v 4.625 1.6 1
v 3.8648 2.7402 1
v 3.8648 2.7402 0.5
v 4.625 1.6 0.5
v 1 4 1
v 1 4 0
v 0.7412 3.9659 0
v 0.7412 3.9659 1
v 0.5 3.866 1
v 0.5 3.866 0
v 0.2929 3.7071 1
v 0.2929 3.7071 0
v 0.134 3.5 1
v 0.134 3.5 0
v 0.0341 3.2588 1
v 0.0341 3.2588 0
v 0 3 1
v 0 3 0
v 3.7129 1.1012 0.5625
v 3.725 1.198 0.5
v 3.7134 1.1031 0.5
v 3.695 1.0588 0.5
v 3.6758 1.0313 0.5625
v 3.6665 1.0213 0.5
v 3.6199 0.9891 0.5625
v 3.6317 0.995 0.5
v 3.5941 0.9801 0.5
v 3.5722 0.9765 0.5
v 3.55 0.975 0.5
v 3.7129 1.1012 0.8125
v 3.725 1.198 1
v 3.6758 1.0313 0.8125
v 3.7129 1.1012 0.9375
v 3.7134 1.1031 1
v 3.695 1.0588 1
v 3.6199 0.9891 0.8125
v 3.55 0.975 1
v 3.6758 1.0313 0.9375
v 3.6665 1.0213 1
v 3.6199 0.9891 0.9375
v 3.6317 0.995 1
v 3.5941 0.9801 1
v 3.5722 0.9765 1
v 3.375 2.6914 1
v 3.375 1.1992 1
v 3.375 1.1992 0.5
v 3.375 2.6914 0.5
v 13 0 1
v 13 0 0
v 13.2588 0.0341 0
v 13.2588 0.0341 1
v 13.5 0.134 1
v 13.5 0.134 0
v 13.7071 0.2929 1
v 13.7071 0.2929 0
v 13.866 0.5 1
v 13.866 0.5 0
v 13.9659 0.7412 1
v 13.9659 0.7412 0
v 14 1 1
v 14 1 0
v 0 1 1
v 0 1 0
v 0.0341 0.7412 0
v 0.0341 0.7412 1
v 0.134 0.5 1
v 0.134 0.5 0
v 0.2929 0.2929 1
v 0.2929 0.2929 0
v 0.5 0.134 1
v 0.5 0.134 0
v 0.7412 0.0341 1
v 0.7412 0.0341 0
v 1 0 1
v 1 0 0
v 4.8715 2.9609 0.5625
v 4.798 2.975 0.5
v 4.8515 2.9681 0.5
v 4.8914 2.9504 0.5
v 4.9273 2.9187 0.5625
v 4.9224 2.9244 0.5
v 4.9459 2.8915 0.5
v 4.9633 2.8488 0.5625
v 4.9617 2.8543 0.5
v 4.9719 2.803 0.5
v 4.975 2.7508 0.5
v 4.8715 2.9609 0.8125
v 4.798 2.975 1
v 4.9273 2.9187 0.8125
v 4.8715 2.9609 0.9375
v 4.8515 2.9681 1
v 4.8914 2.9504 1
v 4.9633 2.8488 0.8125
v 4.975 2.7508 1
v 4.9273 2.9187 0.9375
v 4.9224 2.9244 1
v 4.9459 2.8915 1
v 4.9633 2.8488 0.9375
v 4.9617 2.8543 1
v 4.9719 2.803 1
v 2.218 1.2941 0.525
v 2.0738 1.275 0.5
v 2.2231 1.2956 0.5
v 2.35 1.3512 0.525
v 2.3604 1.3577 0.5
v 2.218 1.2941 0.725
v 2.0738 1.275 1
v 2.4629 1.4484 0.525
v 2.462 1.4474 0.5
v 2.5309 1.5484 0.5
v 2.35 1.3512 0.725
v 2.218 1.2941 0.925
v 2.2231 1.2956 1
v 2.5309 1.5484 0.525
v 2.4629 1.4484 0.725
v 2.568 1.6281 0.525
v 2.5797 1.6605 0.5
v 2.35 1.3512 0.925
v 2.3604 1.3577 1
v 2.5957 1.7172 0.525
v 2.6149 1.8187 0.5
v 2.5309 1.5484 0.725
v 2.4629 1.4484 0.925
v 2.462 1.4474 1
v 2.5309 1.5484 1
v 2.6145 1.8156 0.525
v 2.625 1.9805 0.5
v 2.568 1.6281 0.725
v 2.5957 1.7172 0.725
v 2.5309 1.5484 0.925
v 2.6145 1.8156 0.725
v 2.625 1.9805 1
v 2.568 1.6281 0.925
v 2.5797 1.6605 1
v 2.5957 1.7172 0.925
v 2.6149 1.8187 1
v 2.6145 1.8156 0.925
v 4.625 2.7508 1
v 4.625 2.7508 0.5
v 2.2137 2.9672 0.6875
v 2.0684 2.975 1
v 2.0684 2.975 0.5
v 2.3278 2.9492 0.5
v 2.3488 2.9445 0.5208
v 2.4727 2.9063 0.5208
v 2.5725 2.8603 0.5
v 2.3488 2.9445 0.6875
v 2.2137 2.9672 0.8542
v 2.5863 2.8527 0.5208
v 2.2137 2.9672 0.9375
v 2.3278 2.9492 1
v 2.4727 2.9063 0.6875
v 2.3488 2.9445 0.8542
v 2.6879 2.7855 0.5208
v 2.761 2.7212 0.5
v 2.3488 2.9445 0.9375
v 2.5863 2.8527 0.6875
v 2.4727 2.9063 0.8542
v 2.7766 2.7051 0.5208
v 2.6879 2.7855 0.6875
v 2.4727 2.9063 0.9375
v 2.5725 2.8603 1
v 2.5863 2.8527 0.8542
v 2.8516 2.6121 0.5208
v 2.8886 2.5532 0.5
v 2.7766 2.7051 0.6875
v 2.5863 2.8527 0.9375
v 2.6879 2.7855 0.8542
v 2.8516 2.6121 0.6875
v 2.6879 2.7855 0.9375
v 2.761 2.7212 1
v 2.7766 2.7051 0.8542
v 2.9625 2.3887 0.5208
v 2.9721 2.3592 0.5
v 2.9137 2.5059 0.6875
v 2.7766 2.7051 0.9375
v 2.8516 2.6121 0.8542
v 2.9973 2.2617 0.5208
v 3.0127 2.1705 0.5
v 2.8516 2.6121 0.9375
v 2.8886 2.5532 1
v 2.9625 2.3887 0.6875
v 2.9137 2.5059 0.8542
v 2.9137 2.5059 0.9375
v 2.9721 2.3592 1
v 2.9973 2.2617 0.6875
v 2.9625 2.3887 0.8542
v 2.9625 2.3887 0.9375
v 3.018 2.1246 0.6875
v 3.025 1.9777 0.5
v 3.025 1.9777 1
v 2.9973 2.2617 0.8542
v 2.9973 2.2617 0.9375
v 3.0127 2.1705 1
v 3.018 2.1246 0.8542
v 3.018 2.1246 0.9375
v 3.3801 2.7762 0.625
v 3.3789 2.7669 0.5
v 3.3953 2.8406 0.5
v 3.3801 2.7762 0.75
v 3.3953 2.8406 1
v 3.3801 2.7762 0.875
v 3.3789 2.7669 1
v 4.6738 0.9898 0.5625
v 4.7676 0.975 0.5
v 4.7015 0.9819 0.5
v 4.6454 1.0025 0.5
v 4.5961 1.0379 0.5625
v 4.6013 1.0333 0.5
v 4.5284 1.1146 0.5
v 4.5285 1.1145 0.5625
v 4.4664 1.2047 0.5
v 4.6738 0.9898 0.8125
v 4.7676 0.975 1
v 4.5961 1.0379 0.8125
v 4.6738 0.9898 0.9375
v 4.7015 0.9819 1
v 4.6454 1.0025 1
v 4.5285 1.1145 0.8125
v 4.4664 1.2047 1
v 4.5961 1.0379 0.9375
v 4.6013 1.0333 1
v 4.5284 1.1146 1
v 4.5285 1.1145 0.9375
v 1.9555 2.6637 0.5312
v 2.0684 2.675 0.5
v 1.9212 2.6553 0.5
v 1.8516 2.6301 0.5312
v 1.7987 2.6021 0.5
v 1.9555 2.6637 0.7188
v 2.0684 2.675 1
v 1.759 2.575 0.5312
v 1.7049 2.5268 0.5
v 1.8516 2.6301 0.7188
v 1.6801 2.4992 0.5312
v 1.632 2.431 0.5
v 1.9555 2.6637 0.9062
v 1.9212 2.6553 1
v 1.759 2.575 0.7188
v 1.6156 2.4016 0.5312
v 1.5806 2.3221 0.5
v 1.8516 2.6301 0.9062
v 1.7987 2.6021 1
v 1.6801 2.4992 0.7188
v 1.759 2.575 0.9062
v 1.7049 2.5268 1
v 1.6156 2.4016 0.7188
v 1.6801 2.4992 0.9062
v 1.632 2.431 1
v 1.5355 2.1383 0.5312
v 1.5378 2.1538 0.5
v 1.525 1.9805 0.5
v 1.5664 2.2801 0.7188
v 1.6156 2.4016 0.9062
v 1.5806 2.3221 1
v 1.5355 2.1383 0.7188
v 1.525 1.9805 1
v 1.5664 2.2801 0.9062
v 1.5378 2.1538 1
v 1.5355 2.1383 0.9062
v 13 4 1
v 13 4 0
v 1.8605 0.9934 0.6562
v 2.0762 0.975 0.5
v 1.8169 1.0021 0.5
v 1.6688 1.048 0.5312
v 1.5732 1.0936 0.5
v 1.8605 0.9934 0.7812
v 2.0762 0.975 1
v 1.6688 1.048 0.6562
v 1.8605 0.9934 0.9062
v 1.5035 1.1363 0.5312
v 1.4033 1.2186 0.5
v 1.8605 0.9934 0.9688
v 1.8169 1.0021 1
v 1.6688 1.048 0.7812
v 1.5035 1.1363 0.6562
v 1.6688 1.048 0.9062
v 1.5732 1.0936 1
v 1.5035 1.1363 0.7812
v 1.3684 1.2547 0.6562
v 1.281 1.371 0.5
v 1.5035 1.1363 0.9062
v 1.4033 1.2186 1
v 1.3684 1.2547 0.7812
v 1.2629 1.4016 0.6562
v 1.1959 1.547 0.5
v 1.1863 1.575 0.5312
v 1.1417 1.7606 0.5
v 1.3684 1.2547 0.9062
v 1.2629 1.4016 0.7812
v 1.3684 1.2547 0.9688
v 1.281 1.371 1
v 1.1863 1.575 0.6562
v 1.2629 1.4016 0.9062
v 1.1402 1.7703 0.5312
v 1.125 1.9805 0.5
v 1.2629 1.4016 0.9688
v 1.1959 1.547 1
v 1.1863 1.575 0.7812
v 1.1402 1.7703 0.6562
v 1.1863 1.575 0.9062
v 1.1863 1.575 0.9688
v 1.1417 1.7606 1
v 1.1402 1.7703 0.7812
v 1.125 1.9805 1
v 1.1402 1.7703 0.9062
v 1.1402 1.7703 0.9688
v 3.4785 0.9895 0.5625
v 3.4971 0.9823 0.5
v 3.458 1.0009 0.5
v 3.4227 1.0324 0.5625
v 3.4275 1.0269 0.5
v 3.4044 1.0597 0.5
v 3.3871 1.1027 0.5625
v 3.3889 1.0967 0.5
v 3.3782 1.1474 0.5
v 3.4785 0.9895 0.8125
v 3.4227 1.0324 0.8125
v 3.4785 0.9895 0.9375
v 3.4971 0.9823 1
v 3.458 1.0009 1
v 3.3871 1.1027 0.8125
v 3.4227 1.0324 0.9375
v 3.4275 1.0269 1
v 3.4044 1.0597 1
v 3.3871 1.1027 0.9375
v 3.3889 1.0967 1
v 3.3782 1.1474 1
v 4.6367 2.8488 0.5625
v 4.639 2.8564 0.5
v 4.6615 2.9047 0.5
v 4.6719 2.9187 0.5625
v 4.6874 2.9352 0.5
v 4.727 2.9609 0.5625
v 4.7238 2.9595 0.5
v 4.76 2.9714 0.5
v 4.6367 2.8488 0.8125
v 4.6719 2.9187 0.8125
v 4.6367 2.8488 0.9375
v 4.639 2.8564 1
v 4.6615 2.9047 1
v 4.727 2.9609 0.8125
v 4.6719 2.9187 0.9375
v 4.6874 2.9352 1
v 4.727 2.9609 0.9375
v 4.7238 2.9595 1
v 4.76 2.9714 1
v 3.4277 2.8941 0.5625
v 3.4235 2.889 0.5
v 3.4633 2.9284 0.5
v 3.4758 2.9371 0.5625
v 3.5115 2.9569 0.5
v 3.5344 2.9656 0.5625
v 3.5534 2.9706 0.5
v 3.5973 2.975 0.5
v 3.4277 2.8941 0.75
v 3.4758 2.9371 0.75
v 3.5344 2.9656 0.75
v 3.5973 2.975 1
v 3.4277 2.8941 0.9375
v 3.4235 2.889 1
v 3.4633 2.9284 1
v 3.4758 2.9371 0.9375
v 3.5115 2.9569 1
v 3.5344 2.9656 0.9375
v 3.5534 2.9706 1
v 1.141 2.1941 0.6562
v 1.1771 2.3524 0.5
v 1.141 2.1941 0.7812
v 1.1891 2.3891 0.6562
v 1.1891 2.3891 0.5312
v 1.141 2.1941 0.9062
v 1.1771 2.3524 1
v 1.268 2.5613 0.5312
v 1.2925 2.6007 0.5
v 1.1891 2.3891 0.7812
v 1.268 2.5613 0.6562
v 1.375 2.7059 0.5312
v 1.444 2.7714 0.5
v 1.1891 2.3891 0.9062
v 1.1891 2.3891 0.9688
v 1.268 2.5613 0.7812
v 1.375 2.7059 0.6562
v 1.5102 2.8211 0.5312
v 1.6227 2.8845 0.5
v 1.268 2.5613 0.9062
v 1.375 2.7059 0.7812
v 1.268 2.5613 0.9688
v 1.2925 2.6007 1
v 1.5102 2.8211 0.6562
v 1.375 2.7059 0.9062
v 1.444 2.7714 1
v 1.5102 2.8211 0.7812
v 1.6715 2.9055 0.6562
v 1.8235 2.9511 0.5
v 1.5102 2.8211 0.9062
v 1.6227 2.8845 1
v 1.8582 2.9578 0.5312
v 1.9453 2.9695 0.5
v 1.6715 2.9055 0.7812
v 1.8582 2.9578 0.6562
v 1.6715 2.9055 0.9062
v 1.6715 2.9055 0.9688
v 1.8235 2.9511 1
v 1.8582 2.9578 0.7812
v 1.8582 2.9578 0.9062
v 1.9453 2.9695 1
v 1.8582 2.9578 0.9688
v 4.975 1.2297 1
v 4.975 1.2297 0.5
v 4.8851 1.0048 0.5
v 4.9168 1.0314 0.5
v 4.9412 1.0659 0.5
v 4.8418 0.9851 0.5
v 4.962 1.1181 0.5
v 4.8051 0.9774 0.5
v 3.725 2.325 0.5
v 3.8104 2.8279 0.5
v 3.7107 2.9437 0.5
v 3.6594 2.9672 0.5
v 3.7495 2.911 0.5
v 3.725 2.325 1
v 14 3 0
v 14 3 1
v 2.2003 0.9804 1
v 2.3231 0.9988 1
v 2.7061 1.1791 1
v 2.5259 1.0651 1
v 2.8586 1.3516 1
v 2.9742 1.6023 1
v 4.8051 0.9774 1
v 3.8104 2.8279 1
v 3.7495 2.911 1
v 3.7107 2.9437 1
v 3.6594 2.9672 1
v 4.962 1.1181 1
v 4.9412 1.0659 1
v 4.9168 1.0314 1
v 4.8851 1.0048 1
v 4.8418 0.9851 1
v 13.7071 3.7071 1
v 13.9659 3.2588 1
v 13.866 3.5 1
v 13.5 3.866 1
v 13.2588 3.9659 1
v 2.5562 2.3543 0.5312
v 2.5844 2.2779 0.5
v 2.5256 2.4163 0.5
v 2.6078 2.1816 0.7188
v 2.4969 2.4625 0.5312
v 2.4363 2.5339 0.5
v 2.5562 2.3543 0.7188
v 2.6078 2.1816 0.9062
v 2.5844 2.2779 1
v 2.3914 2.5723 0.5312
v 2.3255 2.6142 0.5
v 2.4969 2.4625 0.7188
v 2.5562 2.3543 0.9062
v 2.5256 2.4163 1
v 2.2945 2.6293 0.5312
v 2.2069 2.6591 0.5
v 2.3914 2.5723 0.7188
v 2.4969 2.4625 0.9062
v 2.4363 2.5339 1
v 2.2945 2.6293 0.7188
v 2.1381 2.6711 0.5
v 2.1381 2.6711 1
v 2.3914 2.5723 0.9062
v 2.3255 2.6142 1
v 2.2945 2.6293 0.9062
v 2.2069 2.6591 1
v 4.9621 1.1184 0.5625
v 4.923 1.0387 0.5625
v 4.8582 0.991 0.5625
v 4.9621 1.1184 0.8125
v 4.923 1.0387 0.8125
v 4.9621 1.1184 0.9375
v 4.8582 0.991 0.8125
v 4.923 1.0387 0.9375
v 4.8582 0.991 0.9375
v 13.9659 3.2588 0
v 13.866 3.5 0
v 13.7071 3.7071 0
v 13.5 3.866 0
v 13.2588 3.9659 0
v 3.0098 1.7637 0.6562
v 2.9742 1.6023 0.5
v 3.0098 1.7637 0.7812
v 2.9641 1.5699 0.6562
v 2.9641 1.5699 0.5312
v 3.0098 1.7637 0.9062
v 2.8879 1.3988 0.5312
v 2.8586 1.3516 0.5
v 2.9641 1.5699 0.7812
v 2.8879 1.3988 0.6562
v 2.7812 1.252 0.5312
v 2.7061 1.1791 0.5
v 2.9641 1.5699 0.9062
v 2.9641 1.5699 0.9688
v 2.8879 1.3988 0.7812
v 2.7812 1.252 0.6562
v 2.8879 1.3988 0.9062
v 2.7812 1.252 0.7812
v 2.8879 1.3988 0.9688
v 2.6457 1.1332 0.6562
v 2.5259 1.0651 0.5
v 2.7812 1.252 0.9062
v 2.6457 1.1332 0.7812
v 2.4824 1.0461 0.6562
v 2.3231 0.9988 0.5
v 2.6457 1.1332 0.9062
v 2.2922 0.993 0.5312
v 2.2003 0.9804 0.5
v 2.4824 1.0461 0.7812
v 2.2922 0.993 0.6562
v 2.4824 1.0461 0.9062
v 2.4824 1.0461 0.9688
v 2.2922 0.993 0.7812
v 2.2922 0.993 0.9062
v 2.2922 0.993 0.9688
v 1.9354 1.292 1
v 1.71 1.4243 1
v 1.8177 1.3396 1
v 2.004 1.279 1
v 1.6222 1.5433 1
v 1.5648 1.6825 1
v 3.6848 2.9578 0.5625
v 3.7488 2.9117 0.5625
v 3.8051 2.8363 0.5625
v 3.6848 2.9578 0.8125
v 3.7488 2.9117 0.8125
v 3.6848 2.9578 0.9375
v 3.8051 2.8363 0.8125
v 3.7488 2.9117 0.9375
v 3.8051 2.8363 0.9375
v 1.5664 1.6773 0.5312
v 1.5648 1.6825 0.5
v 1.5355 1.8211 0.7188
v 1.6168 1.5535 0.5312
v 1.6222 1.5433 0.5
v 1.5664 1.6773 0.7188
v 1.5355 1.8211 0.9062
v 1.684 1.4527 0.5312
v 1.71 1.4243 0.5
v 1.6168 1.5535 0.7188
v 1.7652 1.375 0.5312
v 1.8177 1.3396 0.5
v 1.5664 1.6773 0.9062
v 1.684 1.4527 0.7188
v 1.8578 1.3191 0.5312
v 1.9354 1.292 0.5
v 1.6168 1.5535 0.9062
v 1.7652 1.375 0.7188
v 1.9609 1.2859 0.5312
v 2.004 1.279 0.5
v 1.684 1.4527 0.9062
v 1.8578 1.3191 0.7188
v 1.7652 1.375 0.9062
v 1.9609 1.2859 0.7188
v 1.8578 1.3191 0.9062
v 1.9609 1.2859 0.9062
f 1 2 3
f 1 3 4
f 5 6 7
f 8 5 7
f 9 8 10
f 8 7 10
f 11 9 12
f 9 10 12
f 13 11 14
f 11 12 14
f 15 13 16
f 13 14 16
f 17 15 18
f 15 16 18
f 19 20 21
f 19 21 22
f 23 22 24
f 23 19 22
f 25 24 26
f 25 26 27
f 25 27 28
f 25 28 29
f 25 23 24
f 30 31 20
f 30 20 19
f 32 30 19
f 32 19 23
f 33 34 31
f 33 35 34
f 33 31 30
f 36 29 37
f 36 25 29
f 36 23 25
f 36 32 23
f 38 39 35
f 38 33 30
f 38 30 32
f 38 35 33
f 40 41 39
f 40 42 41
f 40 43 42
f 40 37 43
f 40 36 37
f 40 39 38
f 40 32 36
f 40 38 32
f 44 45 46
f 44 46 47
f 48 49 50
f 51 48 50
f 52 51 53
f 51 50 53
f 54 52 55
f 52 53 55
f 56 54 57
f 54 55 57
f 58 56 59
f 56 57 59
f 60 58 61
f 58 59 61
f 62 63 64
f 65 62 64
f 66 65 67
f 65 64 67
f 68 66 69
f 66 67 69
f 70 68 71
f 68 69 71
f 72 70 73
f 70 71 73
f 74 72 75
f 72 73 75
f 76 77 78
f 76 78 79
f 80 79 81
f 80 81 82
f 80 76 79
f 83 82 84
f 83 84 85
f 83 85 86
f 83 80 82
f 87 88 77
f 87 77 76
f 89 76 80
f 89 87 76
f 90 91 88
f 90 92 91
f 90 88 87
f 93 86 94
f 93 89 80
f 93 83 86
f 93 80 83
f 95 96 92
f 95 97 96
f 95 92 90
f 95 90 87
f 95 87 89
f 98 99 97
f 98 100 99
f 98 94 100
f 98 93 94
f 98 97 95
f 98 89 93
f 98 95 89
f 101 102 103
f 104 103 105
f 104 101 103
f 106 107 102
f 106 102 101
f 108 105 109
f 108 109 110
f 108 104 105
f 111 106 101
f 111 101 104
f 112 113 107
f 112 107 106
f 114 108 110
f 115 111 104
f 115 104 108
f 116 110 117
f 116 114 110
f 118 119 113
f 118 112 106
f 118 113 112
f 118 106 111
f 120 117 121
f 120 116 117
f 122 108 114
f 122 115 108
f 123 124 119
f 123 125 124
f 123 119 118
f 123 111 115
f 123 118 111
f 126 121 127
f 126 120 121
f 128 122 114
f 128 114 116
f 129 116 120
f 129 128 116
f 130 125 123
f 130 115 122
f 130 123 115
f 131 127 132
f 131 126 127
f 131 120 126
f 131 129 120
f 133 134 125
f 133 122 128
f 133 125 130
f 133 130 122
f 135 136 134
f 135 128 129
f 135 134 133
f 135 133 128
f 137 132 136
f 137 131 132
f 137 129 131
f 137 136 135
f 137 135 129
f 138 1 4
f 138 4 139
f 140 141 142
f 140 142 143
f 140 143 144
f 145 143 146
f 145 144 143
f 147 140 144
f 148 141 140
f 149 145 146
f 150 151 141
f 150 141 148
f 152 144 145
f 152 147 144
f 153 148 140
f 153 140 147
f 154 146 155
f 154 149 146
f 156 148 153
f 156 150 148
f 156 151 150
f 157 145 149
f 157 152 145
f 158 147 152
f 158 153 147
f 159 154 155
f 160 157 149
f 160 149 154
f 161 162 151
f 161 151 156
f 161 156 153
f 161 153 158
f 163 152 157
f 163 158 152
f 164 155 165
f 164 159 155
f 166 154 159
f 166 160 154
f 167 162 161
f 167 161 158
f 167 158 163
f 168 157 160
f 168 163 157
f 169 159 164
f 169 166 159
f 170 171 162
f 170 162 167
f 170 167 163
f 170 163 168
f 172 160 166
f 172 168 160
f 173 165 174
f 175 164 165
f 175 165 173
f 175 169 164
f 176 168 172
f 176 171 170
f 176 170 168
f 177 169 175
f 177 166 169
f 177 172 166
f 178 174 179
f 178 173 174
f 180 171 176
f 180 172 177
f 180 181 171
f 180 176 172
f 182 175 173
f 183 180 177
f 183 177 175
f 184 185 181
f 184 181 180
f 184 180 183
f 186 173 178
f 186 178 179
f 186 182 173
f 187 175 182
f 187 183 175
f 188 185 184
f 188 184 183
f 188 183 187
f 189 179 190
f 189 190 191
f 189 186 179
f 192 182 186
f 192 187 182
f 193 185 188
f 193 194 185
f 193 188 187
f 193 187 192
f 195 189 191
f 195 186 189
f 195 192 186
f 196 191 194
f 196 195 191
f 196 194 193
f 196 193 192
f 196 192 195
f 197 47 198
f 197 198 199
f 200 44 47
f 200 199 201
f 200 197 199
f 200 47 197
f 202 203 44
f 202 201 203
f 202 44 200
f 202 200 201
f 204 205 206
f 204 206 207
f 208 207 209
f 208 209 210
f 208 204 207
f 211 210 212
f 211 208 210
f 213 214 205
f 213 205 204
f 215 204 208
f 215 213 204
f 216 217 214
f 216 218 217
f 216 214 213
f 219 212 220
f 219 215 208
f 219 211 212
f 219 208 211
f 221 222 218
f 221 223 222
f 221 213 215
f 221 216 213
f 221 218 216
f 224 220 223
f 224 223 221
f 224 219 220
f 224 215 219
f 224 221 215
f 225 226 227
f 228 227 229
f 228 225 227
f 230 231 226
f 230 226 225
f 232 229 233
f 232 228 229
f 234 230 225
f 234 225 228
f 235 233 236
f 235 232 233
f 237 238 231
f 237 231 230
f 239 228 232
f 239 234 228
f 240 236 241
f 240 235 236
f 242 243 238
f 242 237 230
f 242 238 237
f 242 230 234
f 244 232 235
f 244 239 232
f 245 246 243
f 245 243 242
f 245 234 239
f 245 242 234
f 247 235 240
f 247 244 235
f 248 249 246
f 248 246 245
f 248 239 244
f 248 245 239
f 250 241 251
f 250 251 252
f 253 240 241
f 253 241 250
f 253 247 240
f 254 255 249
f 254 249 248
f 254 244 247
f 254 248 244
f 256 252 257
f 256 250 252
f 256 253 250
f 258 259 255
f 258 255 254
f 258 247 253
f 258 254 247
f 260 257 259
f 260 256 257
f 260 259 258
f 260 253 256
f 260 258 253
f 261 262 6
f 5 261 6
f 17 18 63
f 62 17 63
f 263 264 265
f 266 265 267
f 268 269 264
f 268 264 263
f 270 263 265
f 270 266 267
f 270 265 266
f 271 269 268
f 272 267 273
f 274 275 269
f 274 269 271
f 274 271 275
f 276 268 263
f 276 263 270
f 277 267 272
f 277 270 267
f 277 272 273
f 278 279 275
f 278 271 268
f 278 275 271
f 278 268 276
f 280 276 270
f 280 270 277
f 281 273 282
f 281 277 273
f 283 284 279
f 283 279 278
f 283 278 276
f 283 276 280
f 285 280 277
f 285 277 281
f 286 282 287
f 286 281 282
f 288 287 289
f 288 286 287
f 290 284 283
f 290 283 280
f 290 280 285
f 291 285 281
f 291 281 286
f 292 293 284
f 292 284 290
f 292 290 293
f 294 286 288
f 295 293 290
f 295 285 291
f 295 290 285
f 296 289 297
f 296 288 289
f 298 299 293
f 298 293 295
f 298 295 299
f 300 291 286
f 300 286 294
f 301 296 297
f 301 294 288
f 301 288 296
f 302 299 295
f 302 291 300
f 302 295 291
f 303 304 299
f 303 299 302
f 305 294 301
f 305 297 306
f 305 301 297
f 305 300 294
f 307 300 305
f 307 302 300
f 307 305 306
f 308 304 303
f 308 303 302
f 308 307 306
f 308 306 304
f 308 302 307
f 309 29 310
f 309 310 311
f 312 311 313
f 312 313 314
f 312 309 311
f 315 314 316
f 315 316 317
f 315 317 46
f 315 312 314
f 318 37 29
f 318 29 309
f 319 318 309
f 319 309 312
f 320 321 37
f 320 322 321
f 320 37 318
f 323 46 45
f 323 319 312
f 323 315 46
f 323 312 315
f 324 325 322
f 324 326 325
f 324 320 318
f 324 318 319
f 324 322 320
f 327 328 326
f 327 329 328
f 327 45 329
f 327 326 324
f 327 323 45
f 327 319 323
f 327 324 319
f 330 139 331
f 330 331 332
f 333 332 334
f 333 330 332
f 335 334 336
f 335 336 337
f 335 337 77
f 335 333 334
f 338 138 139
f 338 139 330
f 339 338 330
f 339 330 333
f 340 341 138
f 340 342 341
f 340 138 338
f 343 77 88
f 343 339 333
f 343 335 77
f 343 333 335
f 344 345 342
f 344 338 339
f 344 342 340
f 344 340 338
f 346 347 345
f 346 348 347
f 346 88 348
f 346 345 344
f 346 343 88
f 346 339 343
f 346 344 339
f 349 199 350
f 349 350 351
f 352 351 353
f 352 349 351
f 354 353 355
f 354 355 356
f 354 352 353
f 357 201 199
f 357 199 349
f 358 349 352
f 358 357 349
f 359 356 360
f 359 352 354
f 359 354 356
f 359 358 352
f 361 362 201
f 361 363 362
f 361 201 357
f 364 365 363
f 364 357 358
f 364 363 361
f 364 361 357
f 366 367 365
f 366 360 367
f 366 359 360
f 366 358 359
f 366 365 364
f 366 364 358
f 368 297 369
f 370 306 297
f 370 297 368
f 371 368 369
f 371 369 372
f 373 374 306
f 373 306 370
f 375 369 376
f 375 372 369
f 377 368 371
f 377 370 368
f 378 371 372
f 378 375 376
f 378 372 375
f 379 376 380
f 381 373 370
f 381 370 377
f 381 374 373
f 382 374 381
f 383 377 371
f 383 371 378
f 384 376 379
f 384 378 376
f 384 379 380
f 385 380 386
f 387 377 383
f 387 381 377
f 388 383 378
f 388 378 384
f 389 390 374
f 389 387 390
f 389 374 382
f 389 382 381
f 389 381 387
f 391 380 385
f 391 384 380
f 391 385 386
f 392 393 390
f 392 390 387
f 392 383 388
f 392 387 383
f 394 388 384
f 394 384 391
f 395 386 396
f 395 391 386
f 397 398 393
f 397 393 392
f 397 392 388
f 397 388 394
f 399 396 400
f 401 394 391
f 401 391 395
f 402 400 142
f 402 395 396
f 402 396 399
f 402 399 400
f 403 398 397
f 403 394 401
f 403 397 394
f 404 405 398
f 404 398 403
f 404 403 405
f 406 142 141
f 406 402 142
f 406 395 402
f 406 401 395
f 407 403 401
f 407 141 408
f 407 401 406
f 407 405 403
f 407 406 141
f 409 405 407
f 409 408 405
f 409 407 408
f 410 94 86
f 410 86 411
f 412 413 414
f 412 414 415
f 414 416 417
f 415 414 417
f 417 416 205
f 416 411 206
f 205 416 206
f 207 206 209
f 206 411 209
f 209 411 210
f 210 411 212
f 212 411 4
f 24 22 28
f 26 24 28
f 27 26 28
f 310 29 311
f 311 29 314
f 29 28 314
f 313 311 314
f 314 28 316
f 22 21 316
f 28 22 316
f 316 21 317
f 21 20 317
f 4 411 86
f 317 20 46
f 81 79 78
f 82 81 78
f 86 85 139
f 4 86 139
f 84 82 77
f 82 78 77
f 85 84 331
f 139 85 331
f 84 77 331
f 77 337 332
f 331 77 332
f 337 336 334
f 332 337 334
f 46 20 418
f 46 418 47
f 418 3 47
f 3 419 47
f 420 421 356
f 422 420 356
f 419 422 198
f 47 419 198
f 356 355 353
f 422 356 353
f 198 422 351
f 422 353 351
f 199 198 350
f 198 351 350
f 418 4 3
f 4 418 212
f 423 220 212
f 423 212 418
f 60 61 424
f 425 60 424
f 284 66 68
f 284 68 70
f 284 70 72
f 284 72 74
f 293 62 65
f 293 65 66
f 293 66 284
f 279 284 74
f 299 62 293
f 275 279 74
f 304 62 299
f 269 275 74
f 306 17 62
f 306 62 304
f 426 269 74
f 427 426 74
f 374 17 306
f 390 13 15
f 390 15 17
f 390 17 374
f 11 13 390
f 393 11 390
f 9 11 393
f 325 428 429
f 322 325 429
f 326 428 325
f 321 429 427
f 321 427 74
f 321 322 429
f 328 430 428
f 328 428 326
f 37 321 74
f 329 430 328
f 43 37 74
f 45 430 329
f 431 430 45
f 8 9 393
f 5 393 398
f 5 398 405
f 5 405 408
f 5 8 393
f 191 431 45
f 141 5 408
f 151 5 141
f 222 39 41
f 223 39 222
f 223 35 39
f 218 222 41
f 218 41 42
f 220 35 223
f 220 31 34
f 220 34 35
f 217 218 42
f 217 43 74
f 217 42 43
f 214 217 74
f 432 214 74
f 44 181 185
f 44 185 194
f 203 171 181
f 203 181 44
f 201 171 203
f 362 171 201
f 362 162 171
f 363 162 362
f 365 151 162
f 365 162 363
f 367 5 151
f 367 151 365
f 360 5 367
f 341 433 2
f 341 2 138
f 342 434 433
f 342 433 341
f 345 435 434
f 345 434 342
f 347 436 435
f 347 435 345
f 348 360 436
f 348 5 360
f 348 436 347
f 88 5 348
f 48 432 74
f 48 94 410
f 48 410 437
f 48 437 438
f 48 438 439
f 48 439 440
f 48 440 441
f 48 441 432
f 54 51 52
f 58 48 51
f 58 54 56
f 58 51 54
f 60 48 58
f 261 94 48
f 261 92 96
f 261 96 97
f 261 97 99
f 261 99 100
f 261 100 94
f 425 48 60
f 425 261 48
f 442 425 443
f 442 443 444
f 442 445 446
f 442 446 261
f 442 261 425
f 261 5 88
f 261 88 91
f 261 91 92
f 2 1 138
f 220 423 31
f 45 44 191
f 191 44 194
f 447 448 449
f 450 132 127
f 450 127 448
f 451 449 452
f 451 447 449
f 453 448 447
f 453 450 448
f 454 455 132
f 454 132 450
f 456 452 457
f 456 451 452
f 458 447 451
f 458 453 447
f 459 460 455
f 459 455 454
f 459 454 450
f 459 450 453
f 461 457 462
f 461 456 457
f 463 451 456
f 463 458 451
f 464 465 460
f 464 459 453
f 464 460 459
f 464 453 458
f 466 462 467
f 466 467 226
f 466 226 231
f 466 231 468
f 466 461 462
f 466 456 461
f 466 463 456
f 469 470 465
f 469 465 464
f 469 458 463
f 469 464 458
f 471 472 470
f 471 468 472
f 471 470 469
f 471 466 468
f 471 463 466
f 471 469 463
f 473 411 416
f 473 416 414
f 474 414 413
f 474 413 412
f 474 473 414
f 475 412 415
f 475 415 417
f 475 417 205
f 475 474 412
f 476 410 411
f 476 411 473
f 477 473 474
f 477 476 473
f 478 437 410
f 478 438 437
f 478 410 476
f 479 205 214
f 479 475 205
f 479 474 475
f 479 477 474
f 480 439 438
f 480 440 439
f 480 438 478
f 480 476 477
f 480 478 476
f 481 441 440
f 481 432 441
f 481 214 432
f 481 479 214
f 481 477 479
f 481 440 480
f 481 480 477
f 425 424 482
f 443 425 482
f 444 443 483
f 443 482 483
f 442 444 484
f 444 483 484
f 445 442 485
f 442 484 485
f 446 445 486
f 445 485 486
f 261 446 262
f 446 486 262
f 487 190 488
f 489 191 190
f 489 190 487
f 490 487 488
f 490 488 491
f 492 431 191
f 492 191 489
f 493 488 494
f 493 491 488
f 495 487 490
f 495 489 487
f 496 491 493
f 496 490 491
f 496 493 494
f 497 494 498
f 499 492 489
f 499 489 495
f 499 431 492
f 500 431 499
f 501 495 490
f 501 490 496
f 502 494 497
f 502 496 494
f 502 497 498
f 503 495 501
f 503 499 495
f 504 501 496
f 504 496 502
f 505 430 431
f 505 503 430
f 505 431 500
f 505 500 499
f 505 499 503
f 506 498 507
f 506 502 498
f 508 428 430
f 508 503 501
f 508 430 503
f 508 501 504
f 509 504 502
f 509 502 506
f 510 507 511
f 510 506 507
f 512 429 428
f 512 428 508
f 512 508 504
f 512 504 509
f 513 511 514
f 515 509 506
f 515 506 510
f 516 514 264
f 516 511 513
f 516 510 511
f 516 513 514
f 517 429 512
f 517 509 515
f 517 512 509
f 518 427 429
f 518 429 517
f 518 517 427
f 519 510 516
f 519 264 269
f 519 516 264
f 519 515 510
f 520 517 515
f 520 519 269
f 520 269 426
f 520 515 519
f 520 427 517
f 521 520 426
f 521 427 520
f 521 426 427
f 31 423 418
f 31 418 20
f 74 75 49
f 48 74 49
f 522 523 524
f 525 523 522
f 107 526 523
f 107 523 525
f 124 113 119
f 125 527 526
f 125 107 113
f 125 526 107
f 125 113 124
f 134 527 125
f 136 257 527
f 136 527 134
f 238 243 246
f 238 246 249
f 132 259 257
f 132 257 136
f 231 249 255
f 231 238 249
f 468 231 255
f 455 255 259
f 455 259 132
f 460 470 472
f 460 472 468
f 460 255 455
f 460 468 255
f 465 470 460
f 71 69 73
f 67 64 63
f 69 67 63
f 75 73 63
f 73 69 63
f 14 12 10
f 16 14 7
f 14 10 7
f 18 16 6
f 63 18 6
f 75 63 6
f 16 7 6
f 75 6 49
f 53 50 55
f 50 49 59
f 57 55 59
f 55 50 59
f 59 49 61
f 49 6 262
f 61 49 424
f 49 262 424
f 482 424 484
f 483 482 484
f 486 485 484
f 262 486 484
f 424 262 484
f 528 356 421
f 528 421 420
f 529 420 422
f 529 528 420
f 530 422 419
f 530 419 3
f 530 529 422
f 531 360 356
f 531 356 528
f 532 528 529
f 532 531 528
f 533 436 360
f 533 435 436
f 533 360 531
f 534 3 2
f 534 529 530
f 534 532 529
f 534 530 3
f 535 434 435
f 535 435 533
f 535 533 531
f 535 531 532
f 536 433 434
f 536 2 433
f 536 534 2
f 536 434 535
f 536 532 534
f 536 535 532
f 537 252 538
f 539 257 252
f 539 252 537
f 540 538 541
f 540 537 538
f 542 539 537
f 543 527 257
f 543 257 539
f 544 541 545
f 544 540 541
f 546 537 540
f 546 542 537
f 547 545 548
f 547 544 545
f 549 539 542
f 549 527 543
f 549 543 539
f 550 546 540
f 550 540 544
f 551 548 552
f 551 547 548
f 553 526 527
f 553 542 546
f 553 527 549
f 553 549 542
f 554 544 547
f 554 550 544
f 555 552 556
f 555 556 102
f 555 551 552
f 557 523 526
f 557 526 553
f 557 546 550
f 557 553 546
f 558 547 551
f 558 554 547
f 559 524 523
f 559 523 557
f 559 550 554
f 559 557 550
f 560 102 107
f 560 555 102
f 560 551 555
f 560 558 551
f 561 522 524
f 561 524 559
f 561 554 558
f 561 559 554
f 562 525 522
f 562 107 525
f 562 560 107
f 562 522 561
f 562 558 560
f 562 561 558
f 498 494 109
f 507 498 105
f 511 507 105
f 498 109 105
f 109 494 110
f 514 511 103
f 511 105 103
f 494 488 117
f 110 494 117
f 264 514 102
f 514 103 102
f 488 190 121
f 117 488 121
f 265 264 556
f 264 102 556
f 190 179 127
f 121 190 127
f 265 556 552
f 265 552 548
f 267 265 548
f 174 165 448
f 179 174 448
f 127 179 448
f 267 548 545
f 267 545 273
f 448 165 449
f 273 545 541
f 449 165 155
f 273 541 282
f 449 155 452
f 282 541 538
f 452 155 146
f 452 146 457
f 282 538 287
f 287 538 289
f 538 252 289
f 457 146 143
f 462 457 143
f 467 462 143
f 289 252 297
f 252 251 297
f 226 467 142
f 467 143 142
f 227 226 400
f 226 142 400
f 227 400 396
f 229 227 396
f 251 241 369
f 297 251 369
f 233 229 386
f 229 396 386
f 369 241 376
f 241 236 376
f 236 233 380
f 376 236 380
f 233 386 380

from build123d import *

# Parameters (mm, degrees)
AUFSATZ_LINEAR_AUSTRAGEN1_DEPTH = 1
SCHNITT_LINEAR_AUSTRAGEN1_DEPTH = 0.5


with BuildPart() as part:
    # Skizze1 → Aufsatz-Linear austragen1 (new body)
    with BuildSketch(Plane.XY):
        with BuildLine():
            Line((1, 0), (13, 0))
            ThreePointArc((13, 0), (13.707106781, 0.292893219), (14, 1))
            Line((14, 1), (14, 3))
            ThreePointArc((14, 3), (13.707106781, 3.707106781), (13, 4))
            Line((13, 4), (1, 4))
            ThreePointArc((1, 4), (0.292893219, 3.707106781), (0, 3))
            Line((0, 3), (0, 1))
            ThreePointArc((0, 1), (0.292893219, 0.292893219), (1, 0))
        make_face()
    extrude(amount=AUFSATZ_LINEAR_AUSTRAGEN1_DEPTH)

    # Skizze2 → Schnitt-Linear austragen1 (cut)
    # profile 1 of 2: a face of its own
    with BuildSketch(Plane.XY.offset(1)):
        with BuildLine():
            add(Edge.make_bspline(
                [(2.068359375, 2.975), (2.093112394, 2.974652516), (2.14164836, 2.973971167), (2.213088792, 2.96779492), (2.281989676, 2.95862748), (2.348304365, 2.945431971), (2.411868349, 2.928213747), (2.472693733, 2.90705225), (2.530858895, 2.882017573), (2.586431863, 2.853600887), (2.638802164, 2.821433292), (2.688303235, 2.786256364), (2.73437439, 2.747554036), (2.77712302, 2.705666037), (2.816276383, 2.660478074), (2.852403686, 2.612241049), (2.885226635, 2.56068362), (2.914391718, 2.505816744), (2.940594574, 2.44846024), (2.963340406, 2.388446006), (2.982324979, 2.326028293), (2.998116048, 2.26110371), (3.010084082, 2.193767278), (3.018514176, 2.123861297), (3.024350356, 2.051661497), (3.024781349, 2.002616087), (3.025, 1.977734375)],
                knots=[0, 0, 0, 0, 1.137132438, 2.22970057, 3.292424762, 4.329649132, 5.333981859, 6.315987487, 7.286185149, 8.241436353, 9.181332131, 10.107725602, 11.0292572, 11.943085262, 12.854854597, 13.773819033, 14.709898734, 15.660115542, 16.626635295, 17.605574315, 18.606712189, 19.622473761, 20.67399022, 21.747038223, 22.857027702, 24, 24, 24, 24], degree=3))
            add(Edge.make_bspline(
                [(3.025, 1.977734375), (3.024236943, 1.941248344), (3.022739737, 1.869658489), (3.011382941, 1.76485224), (2.992130943, 1.66508578), (2.965911152, 1.570399581), (2.931448688, 1.481449161), (2.889521373, 1.398351336), (2.839716722, 1.321507209), (2.782571307, 1.250986245), (2.718303636, 1.18718792), (2.646474639, 1.13157047), (2.567529745, 1.084100864), (2.48217021, 1.044116269), (2.38988477, 1.012613038), (2.290860282, 0.991433257), (2.185708374, 0.977018048), (2.11333274, 0.975684634), (2.076171875, 0.975)],
                knots=[0, 0, 0, 0, 1.119700056, 2.196982321, 3.230778928, 4.235358115, 5.208318876, 6.153781848, 7.087131445, 8.013361148, 8.934611457, 9.860297843, 10.794468433, 11.756326826, 12.748403726, 13.780058436, 14.860183413, 16, 16, 16, 16], degree=3))
            add(Edge.make_bspline(
                [(2.076171875, 0.975), (2.03927875, 0.975888232), (1.967053764, 0.977627108), (1.861766869, 0.991561146), (1.762215291, 1.013976035), (1.668967416, 1.04602514), (1.582674595, 1.08683826), (1.502975001, 1.134344554), (1.431414901, 1.190464862), (1.367075118, 1.253597267), (1.309960779, 1.323841341), (1.261404629, 1.401545242), (1.218582067, 1.485017774), (1.184733705, 1.575497068), (1.157803717, 1.671020204), (1.13882396, 1.770875151), (1.127251689, 1.874465923), (1.125758488, 1.944761386), (1.125, 1.98046875)],
                knots=[0, 0, 0, 0, 1.130091603, 2.212359386, 3.247930852, 4.252250901, 5.226719473, 6.16821431, 7.089197795, 8.00610207, 8.925165125, 9.855999165, 10.808795857, 11.79501972, 12.810514548, 13.846493258, 14.906102224, 16, 16, 16, 16], degree=3))
            add(Edge.make_bspline(
                [(1.125, 1.98046875), (1.125688028, 2.016832883), (1.127040936, 2.088337779), (1.139531744, 2.193099625), (1.15925301, 2.293397724), (1.187362441, 2.388727145), (1.223002781, 2.478418194), (1.266262664, 2.561492737), (1.316348518, 2.637693274), (1.373591781, 2.70687478), (1.438083357, 2.768616063), (1.509462446, 2.82261175), (1.587377693, 2.86905948), (1.671832678, 2.907263474), (1.762443164, 2.937927219), (1.859185583, 2.959576748), (1.961878055, 2.97269235), (2.032251673, 2.974217478), (2.068359375, 2.975)],
                knots=[0, 0, 0, 0, 1.125218611, 2.212582392, 3.260701818, 4.286054269, 5.284468473, 6.243521648, 7.180287843, 8.101949555, 9.017004541, 9.937572836, 10.866572707, 11.818894766, 12.801573564, 13.82236102, 14.882684417, 16, 16, 16, 16], degree=3))
        make_face()
        with BuildLine():
            add(Edge.make_bspline(
                [(2.625, 1.98046875), (2.624236115, 2.015277472), (2.622757058, 2.082675226), (2.609648511, 2.180171038), (2.588416712, 2.27060321), (2.563111057, 2.340625009), (2.538811369, 2.392528468), (2.51896586, 2.42865343), (2.497617935, 2.462663361), (2.473388511, 2.493425176), (2.448255174, 2.522406317), (2.421043849, 2.54892338), (2.391707134, 2.572581535), (2.350596581, 2.601296683), (2.295234429, 2.631050621), (2.223753123, 2.656546627), (2.147556711, 2.672258276), (2.09512819, 2.674073293), (2.068359375, 2.675)],
                knots=[0, 0, 0, 0, 1.663767962, 3.22144036, 4.693807908, 6.09809827, 6.772124886, 7.43249818, 8.068074837, 8.689496673, 9.30272399, 9.901527182, 10.503429657, 11.102750509, 12.297797107, 13.495176895, 14.721094103, 16, 16, 16, 16], degree=3))
            add(Edge.make_bspline(
                [(2.068359375, 2.675), (2.04918449, 2.674523021), (2.011287158, 2.673580316), (1.955655243, 2.664627547), (1.902215528, 2.650626376), (1.851216647, 2.631043473), (1.803112784, 2.606035103), (1.758119138, 2.575673263), (1.716778265, 2.540076152), (1.678858763, 2.499387916), (1.64458724, 2.453198562), (1.614182017, 2.401028966), (1.587690016, 2.342878426), (1.565104568, 2.279265806), (1.547241689, 2.210518214), (1.534540277, 2.137356433), (1.526561269, 2.060201883), (1.525528163, 2.007441739), (1.525, 1.98046875)],
                knots=[0, 0, 0, 0, 0.926902171, 1.831933723, 2.71800685, 3.595261319, 4.468550136, 5.334998465, 6.214894287, 7.1017058, 8.020008637, 8.99111482, 10.01694856, 11.106630737, 12.25237115, 13.448355624, 14.695502513, 16, 16, 16, 16], degree=3))
            add(Edge.make_bspline(
                [(1.525, 1.98046875), (1.525529621, 1.953235833), (1.526565779, 1.899956987), (1.534528502, 1.822019496), (1.547312827, 1.74796955), (1.565048146, 1.678113625), (1.58799262, 1.613266121), (1.615536195, 1.554021234), (1.646413772, 1.499956378), (1.682840272, 1.452579062), (1.722186978, 1.410770889), (1.76447307, 1.374356244), (1.809393417, 1.343334803), (1.857378179, 1.318080366), (1.908164293, 1.299131658), (1.961190349, 1.284770984), (2.016800589, 1.276568573), (2.054661701, 1.275527183), (2.073828125, 1.275)],
                knots=[0, 0, 0, 0, 1.300369924, 2.54406124, 3.737115199, 4.88637188, 5.981883645, 7.016846829, 8.003376514, 8.948590554, 9.863559023, 10.741055788, 11.608647785, 12.46534091, 13.323432129, 14.192248925, 15.0848625, 16, 16, 16, 16], degree=3))
            add(Edge.make_bspline(
                [(2.073828125, 1.275), (2.098514049, 1.275826804), (2.147153697, 1.277455889), (2.218375005, 1.292666561), (2.286422084, 1.316581814), (2.340300617, 1.34411813), (2.380907534, 1.371243102), (2.410251531, 1.394127245), (2.437531132, 1.420168305), (2.463533565, 1.448361043), (2.487628227, 1.479320201), (2.510440944, 1.51265316), (2.531503359, 1.54871627), (2.550989754, 1.587307904), (2.568587312, 1.628357856), (2.583936454, 1.67175711), (2.596172475, 1.717696454), (2.606851743, 1.765749251), (2.614975974, 1.816231574), (2.620753103, 1.868901619), (2.624372846, 1.923907557), (2.624787704, 1.961322387), (2.625, 1.98046875)],
                knots=[0, 0, 0, 0, 1.468568495, 2.893578421, 4.316075305, 5.755382189, 6.482330971, 7.222315454, 7.968369796, 8.725783183, 9.504530818, 10.302500265, 11.129737207, 11.9897977, 12.875655565, 13.787998707, 14.728608307, 15.705132475, 16.718642732, 17.771954593, 18.859838044, 20, 20, 20, 20], degree=3))
        make_face(mode=Mode.SUBTRACT)
    # profile 2 of 2: a face of its own
    with BuildSketch(Plane.XY.offset(1)):
        with BuildLine():
            Line((3.86484375, 2.740234375), (4.625, 1.6))
            Line((4.625, 1.6), (4.625, 2.75078125))
            add(Edge.make_bspline(
                [(4.625, 2.75078125), (4.625586836, 2.768395927), (4.626686005, 2.801389002), (4.635036402, 2.847648409), (4.649668068, 2.886889392), (4.670402191, 2.919114128), (4.696180986, 2.944318069), (4.726619023, 2.962223197), (4.761117632, 2.973196011), (4.785463851, 2.974385321), (4.798046875, 2.975)],
                knots=[0, 0, 0, 0, 1.319117216, 2.470765316, 3.505116792, 4.43580569, 5.318756254, 6.18027265, 7.059497782, 8, 8, 8, 8], degree=3))
            add(Edge.make_bspline(
                [(4.798046875, 2.975), (4.811012753, 2.974373778), (4.836109378, 2.97316167), (4.871600638, 2.962412213), (4.902620124, 2.944321241), (4.928806854, 2.919151114), (4.949918941, 2.886925272), (4.965064382, 2.847732261), (4.973280664, 2.80137765), (4.974401563, 2.768391976), (4.975, 2.75078125)],
                knots=[0, 0, 0, 0, 0.959871134, 1.857917088, 2.719075999, 3.600089629, 4.526699118, 5.554128738, 6.694173474, 8, 8, 8, 8], degree=3))
            Line((4.975, 2.75078125), (4.975, 1.2296875))
            add(Edge.make_bspline(
                [(4.975, 1.2296875), (4.974517449, 1.209721265), (4.973611757, 1.172246954), (4.963962629, 1.119848054), (4.947690056, 1.075246898), (4.924922255, 1.038240953), (4.894956518, 1.009207633), (4.857911429, 0.989251615), (4.814719484, 0.976787702), (4.783815821, 0.975615768), (4.767578125, 0.975)],
                knots=[0, 0, 0, 0, 1.276164049, 2.395212213, 3.391561633, 4.297456637, 5.151673506, 6.027862746, 6.963780962, 8, 8, 8, 8], degree=3))
            add(Edge.make_bspline(
                [(4.767578125, 0.975), (4.751115635, 0.975772416), (4.719363897, 0.977262199), (4.673622221, 0.988138948), (4.632032835, 1.008430687), (4.594663962, 1.037771284), (4.55968076, 1.073356467), (4.527659202, 1.11463191), (4.497490318, 1.159350157), (4.476842172, 1.189466295), (4.46640625, 1.2046875)],
                knots=[0, 0, 0, 0, 0.990229924, 1.909888509, 2.806876858, 3.75171819, 4.754420985, 5.802993103, 6.889595585, 8, 8, 8, 8], degree=3))
            Line((4.46640625, 1.2046875), (3.725, 2.325))
            Line((3.725, 2.325), (3.725, 1.198046875))
            add(Edge.make_bspline(
                [(3.725, 1.198046875), (3.724414523, 1.180824483), (3.72330548, 1.148200888), (3.714742096, 1.102326501), (3.698988566, 1.0631574), (3.677344387, 1.0309462), (3.650765302, 1.005883739), (3.620379665, 0.987840533), (3.586282235, 0.976836674), (3.562322205, 0.975623773), (3.55, 0.975)],
                knots=[0, 0, 0, 0, 1.293064309, 2.449392962, 3.484384031, 4.441729672, 5.340986808, 6.204611779, 7.076664708, 8, 8, 8, 8], degree=3))
            add(Edge.make_bspline(
                [(3.55, 0.975), (3.537415957, 0.975600427), (3.512903847, 0.976769981), (3.478206619, 0.988073985), (3.447689985, 1.006729195), (3.421040174, 1.031933145), (3.400304093, 1.064751921), (3.385493226, 1.103922858), (3.376597599, 1.149477245), (3.375553408, 1.181988306), (3.375, 1.19921875)],
                knots=[0, 0, 0, 0, 0.938889884, 1.828837584, 2.693878765, 3.596100726, 4.546832571, 5.570326044, 6.712304089, 8, 8, 8, 8], degree=3))
            Line((3.375, 1.19921875), (3.375, 2.69140625))
            add(Edge.make_bspline(
                [(3.375, 2.69140625), (3.37514655, 2.706394453), (3.375423663, 2.734735734), (3.379522399, 2.774642207), (3.385123318, 2.80976372), (3.392066316, 2.830792867), (3.3953125, 2.840625)],
                knots=[0, 0, 0, 0, 1.18793306, 2.246269525, 3.180047019, 4, 4, 4, 4], degree=3))
            add(Edge.make_bspline(
                [(3.3953125, 2.840625), (3.399668454, 2.850192085), (3.408364875, 2.869292239), (3.427434086, 2.894600683), (3.449198834, 2.91818821), (3.475465064, 2.937620764), (3.503805632, 2.954136488), (3.533862342, 2.966343001), (3.565275925, 2.973670728), (3.5865505, 2.974554753), (3.597265625, 2.975)],
                knots=[0, 0, 0, 0, 0.980600708, 1.957714689, 2.948627098, 3.97434472, 5.000279326, 6.011426356, 6.998437519, 8, 8, 8, 8], degree=3))
            add(Edge.make_bspline(
                [(3.597265625, 2.975), (3.613277137, 2.974362991), (3.643301645, 2.973168483), (3.684701728, 2.959340883), (3.719945443, 2.939070857), (3.750422654, 2.911403027), (3.779239652, 2.877209196), (3.805947743, 2.835053519), (3.834869484, 2.788741916), (3.854699923, 2.756650193), (3.86484375, 2.740234375)],
                knots=[0, 0, 0, 0, 1.01695463, 1.906975685, 2.751376853, 3.592506721, 4.517315556, 5.594915983, 6.76973195, 8, 8, 8, 8], degree=3))
        make_face()
    extrude(amount=-SCHNITT_LINEAR_AUSTRAGEN1_DEPTH, mode=Mode.SUBTRACT)


solid = part.part
